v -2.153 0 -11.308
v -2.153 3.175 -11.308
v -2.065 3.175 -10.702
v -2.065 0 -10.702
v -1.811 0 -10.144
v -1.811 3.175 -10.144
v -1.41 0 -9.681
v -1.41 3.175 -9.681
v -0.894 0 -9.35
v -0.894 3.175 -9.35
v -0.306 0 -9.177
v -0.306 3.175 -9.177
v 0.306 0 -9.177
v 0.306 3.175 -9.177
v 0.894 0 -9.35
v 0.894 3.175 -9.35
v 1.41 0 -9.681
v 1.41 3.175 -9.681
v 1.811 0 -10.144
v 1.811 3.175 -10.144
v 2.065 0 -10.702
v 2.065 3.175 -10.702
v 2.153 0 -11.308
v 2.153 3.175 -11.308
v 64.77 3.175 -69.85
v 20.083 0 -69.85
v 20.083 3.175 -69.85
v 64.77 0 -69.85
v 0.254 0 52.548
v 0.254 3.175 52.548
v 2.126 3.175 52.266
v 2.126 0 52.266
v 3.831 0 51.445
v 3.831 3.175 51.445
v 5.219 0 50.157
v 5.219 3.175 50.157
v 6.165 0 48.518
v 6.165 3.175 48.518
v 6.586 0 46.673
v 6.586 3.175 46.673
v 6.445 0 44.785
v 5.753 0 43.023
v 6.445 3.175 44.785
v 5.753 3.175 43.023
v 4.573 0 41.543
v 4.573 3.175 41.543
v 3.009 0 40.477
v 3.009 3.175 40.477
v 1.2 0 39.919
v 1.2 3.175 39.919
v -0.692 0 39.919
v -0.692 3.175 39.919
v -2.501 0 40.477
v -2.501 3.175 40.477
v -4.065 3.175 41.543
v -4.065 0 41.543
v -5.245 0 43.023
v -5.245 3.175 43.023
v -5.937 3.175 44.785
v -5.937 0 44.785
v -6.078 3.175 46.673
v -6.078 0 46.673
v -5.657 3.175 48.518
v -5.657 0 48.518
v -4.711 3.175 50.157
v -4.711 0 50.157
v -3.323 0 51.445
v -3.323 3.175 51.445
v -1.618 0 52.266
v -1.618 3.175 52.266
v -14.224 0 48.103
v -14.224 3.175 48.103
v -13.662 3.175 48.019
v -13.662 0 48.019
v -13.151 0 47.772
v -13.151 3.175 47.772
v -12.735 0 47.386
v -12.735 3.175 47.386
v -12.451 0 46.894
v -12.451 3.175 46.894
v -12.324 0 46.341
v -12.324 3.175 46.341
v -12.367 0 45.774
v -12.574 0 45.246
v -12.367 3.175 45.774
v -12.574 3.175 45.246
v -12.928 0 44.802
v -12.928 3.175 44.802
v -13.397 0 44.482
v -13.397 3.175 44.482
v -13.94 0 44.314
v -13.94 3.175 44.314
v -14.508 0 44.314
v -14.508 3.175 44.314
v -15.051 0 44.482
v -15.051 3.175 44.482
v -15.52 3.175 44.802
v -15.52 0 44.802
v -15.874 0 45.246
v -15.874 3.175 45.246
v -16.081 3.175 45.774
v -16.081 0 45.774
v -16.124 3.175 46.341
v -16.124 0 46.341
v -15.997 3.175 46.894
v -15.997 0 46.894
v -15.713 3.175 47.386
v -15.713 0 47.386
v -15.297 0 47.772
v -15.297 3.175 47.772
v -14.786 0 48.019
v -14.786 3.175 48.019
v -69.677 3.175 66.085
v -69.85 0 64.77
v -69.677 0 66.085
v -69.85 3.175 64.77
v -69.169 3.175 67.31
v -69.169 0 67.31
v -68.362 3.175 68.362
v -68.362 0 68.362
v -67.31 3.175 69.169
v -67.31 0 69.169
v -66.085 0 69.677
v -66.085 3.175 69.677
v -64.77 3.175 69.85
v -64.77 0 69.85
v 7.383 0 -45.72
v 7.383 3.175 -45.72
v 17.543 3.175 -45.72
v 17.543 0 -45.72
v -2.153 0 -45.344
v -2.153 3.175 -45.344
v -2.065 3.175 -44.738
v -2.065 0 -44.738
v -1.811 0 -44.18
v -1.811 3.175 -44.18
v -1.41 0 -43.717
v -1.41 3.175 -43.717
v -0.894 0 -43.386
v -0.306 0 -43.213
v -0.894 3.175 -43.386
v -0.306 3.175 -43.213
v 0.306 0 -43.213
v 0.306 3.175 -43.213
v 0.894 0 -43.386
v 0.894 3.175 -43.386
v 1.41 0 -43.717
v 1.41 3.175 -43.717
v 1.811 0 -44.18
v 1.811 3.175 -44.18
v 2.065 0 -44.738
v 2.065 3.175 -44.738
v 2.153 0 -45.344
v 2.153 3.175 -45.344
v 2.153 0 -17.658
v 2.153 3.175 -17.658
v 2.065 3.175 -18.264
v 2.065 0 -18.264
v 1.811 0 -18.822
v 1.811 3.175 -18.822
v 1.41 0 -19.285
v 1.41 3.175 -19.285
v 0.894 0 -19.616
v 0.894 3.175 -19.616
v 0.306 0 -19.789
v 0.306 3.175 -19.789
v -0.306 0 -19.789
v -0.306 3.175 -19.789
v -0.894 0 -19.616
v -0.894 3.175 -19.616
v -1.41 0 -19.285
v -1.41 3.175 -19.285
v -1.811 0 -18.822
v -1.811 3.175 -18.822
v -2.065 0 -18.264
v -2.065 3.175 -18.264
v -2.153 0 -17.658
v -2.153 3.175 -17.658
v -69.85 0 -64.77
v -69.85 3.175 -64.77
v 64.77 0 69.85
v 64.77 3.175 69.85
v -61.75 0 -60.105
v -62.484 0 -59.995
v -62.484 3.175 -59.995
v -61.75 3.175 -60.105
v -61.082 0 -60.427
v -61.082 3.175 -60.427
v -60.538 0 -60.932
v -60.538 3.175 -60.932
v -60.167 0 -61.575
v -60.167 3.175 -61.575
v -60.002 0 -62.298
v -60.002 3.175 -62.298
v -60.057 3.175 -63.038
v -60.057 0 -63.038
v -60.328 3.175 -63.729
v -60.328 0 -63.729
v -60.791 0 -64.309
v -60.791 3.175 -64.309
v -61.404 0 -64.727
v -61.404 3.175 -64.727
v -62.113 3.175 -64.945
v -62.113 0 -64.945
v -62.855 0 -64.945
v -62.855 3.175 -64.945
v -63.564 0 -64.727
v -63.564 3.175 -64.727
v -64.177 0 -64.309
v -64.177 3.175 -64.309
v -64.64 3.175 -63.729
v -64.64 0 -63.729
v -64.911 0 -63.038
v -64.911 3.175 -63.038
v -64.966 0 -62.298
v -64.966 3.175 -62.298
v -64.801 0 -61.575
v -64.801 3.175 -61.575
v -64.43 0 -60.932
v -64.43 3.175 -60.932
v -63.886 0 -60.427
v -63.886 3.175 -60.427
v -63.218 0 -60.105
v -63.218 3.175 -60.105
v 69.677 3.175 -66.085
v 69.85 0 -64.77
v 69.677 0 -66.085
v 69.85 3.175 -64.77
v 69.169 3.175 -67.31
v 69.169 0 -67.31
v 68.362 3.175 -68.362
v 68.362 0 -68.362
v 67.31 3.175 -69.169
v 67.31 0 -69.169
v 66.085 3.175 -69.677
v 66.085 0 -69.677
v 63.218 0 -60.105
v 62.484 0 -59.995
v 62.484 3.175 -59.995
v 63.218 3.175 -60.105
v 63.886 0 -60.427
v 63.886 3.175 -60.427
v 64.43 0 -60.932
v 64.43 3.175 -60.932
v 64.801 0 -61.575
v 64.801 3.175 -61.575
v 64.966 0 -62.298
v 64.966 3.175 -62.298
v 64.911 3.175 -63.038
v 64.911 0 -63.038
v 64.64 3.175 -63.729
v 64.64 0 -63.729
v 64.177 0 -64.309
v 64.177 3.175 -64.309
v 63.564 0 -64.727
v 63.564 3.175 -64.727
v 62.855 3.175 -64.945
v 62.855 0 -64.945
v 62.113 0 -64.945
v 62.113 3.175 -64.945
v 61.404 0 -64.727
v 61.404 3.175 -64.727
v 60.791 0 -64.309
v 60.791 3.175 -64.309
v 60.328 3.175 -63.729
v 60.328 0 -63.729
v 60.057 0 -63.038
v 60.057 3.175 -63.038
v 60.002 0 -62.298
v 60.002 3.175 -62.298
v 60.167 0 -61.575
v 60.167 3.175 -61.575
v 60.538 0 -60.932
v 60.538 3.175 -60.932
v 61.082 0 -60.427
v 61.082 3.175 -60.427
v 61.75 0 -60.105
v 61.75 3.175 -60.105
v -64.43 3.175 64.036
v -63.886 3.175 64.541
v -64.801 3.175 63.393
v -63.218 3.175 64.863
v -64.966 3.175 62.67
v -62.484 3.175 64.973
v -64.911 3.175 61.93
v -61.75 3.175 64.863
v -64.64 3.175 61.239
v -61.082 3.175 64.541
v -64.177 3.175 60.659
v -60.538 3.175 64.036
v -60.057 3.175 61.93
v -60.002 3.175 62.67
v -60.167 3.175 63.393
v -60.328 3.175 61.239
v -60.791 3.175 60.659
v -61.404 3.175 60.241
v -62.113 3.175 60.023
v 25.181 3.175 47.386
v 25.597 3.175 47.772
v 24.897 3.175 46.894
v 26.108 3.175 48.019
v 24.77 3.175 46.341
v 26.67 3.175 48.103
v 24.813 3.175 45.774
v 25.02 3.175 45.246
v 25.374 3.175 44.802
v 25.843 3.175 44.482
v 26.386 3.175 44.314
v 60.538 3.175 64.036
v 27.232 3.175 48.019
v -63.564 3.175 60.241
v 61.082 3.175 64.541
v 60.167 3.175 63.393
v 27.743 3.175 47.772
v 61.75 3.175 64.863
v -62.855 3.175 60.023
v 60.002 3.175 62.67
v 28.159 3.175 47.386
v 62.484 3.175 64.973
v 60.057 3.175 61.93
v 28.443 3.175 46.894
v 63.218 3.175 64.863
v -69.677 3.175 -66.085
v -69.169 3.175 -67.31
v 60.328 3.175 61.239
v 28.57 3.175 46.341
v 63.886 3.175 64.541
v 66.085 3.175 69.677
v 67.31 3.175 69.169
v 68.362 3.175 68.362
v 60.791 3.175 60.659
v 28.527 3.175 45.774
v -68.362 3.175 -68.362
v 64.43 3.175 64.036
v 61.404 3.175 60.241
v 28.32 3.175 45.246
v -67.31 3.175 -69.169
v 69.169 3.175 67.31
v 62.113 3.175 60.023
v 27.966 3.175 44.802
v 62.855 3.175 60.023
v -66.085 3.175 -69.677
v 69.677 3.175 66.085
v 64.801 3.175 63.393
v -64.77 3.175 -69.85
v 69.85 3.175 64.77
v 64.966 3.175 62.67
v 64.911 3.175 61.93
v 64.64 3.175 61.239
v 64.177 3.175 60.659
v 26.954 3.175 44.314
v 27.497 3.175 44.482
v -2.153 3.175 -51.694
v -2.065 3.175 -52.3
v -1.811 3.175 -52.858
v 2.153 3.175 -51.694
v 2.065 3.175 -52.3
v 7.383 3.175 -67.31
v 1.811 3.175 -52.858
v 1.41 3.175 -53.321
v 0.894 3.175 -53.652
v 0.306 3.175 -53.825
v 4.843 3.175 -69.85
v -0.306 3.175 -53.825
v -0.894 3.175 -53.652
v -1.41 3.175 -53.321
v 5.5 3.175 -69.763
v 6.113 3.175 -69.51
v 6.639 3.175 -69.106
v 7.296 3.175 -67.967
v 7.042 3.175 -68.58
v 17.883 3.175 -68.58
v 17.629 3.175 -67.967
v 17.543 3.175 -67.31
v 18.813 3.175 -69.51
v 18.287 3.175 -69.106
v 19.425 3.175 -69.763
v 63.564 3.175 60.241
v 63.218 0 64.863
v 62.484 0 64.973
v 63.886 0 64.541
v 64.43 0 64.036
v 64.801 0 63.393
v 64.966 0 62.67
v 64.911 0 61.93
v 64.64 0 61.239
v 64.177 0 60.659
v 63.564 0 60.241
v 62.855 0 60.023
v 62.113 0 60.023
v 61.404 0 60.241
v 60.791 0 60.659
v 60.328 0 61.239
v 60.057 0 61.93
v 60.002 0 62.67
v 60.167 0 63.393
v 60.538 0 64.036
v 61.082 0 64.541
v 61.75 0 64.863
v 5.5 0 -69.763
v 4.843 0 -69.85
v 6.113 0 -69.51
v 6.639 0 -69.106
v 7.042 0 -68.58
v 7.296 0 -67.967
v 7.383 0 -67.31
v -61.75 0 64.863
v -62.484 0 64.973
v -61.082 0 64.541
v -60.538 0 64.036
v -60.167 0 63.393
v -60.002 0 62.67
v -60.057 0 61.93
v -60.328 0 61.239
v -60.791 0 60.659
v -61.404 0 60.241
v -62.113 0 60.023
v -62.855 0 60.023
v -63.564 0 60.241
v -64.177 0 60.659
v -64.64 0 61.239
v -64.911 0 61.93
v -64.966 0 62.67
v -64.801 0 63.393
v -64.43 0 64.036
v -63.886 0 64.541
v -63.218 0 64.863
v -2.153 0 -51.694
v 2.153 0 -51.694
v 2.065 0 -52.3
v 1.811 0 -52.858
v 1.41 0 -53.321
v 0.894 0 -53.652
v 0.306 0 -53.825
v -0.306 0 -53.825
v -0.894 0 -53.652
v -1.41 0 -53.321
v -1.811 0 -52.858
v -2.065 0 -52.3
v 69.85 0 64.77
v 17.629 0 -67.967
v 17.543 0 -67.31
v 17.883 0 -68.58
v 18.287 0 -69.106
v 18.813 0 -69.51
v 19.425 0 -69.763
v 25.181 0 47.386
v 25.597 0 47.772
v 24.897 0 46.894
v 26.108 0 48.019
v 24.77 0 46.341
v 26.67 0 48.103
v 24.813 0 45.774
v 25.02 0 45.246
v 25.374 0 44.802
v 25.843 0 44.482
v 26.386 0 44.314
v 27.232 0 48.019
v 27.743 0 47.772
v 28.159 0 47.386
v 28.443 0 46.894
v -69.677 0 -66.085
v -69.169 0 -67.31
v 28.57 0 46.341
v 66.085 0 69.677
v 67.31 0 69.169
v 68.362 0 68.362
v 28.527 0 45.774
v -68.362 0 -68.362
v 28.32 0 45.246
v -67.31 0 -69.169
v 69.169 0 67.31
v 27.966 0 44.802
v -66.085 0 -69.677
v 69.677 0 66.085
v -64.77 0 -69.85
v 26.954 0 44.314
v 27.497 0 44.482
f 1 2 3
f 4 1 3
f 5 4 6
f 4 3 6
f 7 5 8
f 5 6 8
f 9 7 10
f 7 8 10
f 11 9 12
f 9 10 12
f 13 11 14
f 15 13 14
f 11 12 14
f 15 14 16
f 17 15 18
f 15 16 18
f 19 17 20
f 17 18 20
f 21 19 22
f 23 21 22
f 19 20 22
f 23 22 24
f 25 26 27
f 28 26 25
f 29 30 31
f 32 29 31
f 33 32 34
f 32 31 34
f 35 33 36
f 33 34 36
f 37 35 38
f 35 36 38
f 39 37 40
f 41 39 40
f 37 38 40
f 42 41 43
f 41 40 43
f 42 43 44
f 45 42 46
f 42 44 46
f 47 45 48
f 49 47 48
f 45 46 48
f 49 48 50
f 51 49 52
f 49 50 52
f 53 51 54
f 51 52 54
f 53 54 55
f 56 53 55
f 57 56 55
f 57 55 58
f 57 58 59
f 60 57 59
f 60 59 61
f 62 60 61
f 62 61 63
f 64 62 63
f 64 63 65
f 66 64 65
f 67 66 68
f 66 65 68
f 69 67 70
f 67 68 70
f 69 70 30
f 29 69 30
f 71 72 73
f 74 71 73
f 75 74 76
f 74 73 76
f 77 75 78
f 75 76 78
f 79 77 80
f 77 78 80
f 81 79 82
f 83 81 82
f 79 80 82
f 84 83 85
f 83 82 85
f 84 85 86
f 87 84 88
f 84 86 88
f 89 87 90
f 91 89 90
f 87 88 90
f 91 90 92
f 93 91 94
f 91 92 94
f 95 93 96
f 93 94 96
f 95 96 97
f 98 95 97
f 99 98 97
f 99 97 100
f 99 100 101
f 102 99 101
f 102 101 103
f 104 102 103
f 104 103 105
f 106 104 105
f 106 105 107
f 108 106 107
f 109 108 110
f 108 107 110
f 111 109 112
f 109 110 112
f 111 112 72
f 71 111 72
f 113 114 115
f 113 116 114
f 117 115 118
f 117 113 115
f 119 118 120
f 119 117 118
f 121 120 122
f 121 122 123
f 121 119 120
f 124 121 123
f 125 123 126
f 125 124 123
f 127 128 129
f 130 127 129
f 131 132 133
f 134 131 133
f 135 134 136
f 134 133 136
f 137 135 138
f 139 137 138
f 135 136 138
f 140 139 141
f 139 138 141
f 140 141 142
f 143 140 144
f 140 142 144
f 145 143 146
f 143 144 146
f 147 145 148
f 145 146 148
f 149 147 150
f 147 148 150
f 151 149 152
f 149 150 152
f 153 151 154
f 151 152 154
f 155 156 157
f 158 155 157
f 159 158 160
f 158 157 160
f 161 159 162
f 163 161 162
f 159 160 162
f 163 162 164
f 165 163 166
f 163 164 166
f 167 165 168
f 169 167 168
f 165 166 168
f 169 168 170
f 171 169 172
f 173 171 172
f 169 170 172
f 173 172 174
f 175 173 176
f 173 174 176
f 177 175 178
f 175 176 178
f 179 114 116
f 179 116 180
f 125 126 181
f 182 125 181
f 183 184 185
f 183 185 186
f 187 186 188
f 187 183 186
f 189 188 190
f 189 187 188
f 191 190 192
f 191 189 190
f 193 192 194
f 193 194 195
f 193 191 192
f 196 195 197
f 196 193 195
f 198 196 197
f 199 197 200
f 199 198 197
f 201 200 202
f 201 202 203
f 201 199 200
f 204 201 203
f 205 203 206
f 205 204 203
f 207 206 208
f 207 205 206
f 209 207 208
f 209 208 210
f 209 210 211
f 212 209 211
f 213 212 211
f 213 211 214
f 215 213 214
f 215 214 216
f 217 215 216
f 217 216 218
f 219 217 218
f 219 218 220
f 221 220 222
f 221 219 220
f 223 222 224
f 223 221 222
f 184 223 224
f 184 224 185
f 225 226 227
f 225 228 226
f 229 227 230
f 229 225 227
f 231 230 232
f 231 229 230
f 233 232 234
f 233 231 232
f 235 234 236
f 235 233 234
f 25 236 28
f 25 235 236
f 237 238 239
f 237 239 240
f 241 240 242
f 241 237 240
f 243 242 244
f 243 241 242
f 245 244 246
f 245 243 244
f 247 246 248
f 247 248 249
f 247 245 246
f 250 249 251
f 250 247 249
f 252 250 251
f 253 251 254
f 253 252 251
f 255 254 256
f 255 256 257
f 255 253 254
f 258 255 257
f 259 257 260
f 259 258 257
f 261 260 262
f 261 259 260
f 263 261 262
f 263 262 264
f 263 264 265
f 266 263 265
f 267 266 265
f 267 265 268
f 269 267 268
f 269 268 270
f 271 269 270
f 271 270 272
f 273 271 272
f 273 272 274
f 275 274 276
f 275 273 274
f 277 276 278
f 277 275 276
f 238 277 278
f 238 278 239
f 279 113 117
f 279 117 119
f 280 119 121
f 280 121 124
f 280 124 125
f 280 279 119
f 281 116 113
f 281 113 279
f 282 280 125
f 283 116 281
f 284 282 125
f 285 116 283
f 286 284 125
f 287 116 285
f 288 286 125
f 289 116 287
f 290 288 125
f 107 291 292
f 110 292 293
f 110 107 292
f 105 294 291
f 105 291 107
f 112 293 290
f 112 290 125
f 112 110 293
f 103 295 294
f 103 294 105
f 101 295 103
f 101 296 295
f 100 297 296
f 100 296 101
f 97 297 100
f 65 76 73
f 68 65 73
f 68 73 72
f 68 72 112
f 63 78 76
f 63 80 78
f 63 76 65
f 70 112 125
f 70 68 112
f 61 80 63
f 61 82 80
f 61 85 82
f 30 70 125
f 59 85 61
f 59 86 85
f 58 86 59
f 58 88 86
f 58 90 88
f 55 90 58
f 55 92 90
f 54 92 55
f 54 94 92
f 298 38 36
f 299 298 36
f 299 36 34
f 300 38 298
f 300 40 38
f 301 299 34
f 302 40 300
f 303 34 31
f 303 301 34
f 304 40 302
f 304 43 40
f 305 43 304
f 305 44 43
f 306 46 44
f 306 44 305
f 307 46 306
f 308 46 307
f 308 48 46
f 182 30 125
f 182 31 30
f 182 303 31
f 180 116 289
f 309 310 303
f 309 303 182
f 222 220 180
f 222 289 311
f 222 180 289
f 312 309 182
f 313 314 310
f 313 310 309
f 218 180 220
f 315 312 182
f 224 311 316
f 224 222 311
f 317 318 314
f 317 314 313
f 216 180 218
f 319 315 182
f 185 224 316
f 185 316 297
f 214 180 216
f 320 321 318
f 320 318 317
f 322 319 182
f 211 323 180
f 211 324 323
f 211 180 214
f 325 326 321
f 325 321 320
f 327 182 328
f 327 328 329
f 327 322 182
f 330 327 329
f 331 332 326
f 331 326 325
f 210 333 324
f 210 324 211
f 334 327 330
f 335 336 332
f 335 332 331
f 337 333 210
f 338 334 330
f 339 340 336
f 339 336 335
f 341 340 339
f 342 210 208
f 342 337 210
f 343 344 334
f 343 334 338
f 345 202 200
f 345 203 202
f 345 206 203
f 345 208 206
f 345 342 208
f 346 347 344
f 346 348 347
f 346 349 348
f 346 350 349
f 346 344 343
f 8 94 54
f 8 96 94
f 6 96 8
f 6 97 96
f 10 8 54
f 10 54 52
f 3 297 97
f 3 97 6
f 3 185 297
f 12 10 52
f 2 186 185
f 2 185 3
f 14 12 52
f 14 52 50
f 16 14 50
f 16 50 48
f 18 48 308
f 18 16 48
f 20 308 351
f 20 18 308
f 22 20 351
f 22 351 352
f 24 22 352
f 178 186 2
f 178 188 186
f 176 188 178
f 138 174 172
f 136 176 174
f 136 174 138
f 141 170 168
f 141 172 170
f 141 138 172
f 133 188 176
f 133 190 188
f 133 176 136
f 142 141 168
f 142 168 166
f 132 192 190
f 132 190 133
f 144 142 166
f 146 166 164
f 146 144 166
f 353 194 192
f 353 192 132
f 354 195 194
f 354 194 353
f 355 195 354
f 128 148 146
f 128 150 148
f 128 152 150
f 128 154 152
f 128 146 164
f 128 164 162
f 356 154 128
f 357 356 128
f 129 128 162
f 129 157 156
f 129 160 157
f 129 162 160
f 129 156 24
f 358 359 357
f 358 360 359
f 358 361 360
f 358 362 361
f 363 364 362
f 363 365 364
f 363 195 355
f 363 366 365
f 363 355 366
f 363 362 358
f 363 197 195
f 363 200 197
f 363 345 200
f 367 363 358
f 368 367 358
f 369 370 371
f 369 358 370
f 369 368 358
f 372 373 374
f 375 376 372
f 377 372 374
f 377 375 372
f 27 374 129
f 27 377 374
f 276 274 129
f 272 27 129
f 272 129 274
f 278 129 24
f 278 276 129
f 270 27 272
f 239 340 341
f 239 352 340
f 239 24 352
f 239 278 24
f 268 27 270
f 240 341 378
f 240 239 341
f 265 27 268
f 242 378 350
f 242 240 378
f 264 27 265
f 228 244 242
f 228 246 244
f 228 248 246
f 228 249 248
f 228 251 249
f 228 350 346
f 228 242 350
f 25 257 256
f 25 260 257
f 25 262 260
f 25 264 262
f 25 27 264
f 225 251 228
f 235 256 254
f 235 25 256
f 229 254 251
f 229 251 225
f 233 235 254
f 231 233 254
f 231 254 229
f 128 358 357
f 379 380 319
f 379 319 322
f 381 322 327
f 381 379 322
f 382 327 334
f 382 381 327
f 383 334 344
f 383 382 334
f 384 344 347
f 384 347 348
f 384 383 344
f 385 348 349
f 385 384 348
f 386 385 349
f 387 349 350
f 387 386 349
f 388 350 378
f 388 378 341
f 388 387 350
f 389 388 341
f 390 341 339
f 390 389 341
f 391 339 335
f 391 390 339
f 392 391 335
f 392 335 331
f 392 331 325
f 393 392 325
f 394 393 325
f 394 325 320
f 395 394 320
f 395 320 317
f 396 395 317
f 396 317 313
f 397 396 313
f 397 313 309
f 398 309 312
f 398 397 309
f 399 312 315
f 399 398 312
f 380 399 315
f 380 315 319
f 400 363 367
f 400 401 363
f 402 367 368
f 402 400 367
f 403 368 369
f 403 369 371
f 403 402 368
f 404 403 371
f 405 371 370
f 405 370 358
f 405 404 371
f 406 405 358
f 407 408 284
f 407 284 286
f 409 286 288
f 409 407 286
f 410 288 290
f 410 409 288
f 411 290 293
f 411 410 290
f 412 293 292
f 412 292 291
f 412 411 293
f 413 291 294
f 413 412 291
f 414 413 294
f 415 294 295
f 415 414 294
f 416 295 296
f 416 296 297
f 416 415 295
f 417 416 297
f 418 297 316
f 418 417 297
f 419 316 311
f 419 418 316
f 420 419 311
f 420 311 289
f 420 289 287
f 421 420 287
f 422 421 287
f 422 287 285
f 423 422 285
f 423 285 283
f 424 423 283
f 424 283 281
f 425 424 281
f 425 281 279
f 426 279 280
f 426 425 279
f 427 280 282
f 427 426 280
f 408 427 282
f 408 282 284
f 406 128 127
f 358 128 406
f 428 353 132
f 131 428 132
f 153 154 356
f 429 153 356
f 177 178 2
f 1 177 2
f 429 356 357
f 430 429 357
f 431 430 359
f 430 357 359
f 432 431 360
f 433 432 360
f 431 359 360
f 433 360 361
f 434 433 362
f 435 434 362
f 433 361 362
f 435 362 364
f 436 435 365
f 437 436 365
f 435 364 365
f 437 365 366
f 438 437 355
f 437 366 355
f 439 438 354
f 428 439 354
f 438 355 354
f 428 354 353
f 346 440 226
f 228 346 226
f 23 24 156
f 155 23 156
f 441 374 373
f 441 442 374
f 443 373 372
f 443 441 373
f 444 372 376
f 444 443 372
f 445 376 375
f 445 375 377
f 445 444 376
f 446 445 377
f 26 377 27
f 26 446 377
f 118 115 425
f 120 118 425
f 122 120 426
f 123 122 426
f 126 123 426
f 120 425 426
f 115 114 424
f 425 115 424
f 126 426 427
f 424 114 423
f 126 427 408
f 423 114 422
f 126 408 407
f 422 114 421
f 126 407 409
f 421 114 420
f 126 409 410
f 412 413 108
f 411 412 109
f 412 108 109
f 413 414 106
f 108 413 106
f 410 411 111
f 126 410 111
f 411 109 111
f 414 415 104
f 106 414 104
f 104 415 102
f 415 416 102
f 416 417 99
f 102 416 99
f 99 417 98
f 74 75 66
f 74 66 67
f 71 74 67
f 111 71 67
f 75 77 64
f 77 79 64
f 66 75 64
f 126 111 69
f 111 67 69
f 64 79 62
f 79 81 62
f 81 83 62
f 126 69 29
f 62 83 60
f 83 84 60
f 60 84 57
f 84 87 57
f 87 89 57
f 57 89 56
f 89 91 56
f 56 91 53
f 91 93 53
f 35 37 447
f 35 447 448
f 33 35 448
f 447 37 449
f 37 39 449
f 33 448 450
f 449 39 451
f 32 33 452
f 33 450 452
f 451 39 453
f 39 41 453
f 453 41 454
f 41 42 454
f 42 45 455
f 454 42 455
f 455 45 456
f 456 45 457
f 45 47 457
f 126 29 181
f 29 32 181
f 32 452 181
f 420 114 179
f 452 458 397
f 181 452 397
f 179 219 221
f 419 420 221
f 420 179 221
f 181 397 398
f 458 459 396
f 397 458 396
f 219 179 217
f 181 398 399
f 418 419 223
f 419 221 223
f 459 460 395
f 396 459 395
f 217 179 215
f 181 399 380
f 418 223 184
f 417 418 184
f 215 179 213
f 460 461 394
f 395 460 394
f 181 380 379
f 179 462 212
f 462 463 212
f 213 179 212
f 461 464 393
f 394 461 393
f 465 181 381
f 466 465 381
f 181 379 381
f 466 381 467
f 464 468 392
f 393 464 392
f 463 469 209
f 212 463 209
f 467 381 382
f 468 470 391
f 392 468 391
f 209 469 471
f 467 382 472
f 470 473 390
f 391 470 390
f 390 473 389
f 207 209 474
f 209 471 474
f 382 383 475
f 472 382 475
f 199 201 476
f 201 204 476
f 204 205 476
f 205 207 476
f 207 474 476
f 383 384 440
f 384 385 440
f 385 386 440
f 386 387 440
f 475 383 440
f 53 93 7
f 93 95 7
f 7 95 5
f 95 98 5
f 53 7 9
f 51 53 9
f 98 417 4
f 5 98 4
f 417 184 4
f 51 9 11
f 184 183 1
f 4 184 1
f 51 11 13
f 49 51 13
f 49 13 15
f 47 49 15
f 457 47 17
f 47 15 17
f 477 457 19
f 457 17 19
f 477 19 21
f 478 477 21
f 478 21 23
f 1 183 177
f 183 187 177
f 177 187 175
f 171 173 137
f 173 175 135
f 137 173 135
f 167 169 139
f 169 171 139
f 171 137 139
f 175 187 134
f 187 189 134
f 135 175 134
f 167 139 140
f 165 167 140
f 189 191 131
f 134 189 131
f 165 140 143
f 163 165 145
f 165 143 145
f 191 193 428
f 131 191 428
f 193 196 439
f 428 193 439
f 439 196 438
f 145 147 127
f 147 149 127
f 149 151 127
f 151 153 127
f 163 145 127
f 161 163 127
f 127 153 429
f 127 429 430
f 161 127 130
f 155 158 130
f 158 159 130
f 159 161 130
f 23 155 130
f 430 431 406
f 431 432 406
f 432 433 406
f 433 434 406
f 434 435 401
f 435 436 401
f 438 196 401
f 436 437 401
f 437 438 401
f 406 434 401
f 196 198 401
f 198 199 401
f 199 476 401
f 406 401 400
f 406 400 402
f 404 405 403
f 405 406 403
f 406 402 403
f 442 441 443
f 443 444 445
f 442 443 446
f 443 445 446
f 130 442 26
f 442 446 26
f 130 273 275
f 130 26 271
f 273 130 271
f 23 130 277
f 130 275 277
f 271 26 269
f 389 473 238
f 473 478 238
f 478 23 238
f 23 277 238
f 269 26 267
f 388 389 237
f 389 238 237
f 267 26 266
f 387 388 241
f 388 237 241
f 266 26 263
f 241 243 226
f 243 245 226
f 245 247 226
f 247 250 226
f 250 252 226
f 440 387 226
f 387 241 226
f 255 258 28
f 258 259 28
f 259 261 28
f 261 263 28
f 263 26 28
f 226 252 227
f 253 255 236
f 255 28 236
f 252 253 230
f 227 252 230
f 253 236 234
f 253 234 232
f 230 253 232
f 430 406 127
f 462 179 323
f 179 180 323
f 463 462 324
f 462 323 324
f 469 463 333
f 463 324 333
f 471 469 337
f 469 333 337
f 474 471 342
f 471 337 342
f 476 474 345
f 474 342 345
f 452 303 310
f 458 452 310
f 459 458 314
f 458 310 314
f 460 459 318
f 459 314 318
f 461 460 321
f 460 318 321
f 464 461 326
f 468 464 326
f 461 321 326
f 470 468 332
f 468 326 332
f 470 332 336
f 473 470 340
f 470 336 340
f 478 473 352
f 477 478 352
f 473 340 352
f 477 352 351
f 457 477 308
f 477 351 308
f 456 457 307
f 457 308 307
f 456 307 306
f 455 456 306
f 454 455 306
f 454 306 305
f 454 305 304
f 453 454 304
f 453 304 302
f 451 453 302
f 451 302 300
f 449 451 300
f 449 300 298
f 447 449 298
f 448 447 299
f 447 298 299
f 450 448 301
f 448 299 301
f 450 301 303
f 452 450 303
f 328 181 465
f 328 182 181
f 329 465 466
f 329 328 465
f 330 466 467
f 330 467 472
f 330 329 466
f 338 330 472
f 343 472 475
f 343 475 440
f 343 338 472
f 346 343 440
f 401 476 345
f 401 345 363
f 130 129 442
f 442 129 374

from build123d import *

# Parameters (mm, degrees)
SKETCH1_W           = 139.7
SKETCH1_H           = 139.7
SKETCH1_R           = 2.4892
BOSS_EXTRUDE1_DEPTH = 3.175
SKETCH2_W           = 10.16
SKETCH2_H           = 24.13
CUT_EXTRUDE2_DEPTH  = 3.175
SKETCH3_R           = 6.35
SKETCH3_R_2         = 1.905
CUT_EXTRUDE4_DEPTH  = 3.175
FILLET2_R           = 5.08
FILLET3_R           = 5.08
FILLET4_R           = 5.08
FILLET5_R           = 5.08
FILLET6_R           = 2.54
FILLET8_R           = 2.54


with BuildPart() as part:
    # Sketch1 → Boss-Extrude1 (new body)
    with BuildSketch(Plane(origin=(0, 0, 0), x_dir=(1, 0, 0), z_dir=(0, 1, 0))):
        Rectangle(SKETCH1_W, SKETCH1_H)
        with Locations(Location((62.484, -62.484, 0), (0, 0, 270))):
            Circle(SKETCH1_R, mode=Mode.SUBTRACT)
        with Locations(Location((-62.484, 62.484, 0), (0, 0, 270))):
            Circle(SKETCH1_R, mode=Mode.SUBTRACT)
        with Locations(Location((62.484, 62.484, 0), (0, 0, 270))):
            Circle(SKETCH1_R, mode=Mode.SUBTRACT)
        with Locations(Location((-62.484, -62.484, 0), (0, 0, 270))):
            Circle(SKETCH1_R, mode=Mode.SUBTRACT)
    extrude(amount=BOSS_EXTRUDE1_DEPTH)

    # Sketch2 → Cut-Extrude2 (cut)
    with BuildSketch(Plane(origin=(0, 3.175, 0), x_dir=(1, 0, 0), z_dir=(0, 1, 0))):
        with Locations((12.46265, 57.785)):
            Rectangle(SKETCH2_W, SKETCH2_H)
        with BuildLine():
            ThreePointArc((-2.15265, 45.344), (0, 43.19135), (2.15265, 45.344))
            Line((2.15265, 45.344), (2.15265, 51.694))
            ThreePointArc((2.15265, 51.694), (0, 53.84665), (-2.15265, 51.694))
            Line((-2.15265, 51.694), (-2.15265, 45.344))
        make_face()
        with BuildLine():
            ThreePointArc((2.15265, 17.658), (0, 19.81065), (-2.15265, 17.658))
            Line((-2.15265, 17.658), (-2.15265, 11.308))
            ThreePointArc((-2.15265, 11.308), (0, 9.15535), (2.15265, 11.308))
            Line((2.15265, 11.308), (2.15265, 17.658))
        make_face()
    extrude(amount=-CUT_EXTRUDE2_DEPTH, mode=Mode.SUBTRACT)

    # Sketch3 → Cut-Extrude4 (cut)
    with BuildSketch(Plane(origin=(0, 3.175, 0), x_dir=(1, 0, 0), z_dir=(0, 1, 0))):
        with Locations(Location((0.254, -46.198145278, 0), (0, 0, 270))):
            Circle(SKETCH3_R)
        with Locations(Location((26.67, -46.198145278, 0), (0, 0, 270))):
            Circle(SKETCH3_R_2)
        with Locations(Location((-14.224, -46.198145278, 0), (0, 0, 270))):
            Circle(SKETCH3_R_2)
    extrude(amount=-CUT_EXTRUDE4_DEPTH, mode=Mode.SUBTRACT)

    # Fillet2
    fillet2_edges = [part.edges().sort_by_distance(p)[0] for p in [
        (-69.85, 1.5875, 69.85),
    ]]
    fillet(fillet2_edges, radius=FILLET2_R)

    # Fillet3
    fillet3_edges = [part.edges().sort_by_distance(p)[0] for p in [
        (69.85, 1.5875, 69.85),
    ]]
    fillet(fillet3_edges, radius=FILLET3_R)

    # Fillet4
    fillet4_edges = [part.edges().sort_by_distance(p)[0] for p in [
        (69.85, 1.5875, -69.85),
    ]]
    fillet(fillet4_edges, radius=FILLET4_R)

    # Fillet5
    fillet5_edges = [part.edges().sort_by_distance(p)[0] for p in [
        (-69.85, 1.5875, -69.85),
    ]]
    fillet(fillet5_edges, radius=FILLET5_R)

    # Fillet6
    fillet6_edges = [part.edges().sort_by_distance(p)[0] for p in [
        (7.38265, 1.5875, -69.85),
    ]]
    fillet(fillet6_edges, radius=FILLET6_R)

    # Fillet8
    fillet8_edges = [part.edges().sort_by_distance(p)[0] for p in [
        (17.54265, 1.5875, -69.85),
    ]]
    fillet(fillet8_edges, radius=FILLET8_R)


solid = part.part
